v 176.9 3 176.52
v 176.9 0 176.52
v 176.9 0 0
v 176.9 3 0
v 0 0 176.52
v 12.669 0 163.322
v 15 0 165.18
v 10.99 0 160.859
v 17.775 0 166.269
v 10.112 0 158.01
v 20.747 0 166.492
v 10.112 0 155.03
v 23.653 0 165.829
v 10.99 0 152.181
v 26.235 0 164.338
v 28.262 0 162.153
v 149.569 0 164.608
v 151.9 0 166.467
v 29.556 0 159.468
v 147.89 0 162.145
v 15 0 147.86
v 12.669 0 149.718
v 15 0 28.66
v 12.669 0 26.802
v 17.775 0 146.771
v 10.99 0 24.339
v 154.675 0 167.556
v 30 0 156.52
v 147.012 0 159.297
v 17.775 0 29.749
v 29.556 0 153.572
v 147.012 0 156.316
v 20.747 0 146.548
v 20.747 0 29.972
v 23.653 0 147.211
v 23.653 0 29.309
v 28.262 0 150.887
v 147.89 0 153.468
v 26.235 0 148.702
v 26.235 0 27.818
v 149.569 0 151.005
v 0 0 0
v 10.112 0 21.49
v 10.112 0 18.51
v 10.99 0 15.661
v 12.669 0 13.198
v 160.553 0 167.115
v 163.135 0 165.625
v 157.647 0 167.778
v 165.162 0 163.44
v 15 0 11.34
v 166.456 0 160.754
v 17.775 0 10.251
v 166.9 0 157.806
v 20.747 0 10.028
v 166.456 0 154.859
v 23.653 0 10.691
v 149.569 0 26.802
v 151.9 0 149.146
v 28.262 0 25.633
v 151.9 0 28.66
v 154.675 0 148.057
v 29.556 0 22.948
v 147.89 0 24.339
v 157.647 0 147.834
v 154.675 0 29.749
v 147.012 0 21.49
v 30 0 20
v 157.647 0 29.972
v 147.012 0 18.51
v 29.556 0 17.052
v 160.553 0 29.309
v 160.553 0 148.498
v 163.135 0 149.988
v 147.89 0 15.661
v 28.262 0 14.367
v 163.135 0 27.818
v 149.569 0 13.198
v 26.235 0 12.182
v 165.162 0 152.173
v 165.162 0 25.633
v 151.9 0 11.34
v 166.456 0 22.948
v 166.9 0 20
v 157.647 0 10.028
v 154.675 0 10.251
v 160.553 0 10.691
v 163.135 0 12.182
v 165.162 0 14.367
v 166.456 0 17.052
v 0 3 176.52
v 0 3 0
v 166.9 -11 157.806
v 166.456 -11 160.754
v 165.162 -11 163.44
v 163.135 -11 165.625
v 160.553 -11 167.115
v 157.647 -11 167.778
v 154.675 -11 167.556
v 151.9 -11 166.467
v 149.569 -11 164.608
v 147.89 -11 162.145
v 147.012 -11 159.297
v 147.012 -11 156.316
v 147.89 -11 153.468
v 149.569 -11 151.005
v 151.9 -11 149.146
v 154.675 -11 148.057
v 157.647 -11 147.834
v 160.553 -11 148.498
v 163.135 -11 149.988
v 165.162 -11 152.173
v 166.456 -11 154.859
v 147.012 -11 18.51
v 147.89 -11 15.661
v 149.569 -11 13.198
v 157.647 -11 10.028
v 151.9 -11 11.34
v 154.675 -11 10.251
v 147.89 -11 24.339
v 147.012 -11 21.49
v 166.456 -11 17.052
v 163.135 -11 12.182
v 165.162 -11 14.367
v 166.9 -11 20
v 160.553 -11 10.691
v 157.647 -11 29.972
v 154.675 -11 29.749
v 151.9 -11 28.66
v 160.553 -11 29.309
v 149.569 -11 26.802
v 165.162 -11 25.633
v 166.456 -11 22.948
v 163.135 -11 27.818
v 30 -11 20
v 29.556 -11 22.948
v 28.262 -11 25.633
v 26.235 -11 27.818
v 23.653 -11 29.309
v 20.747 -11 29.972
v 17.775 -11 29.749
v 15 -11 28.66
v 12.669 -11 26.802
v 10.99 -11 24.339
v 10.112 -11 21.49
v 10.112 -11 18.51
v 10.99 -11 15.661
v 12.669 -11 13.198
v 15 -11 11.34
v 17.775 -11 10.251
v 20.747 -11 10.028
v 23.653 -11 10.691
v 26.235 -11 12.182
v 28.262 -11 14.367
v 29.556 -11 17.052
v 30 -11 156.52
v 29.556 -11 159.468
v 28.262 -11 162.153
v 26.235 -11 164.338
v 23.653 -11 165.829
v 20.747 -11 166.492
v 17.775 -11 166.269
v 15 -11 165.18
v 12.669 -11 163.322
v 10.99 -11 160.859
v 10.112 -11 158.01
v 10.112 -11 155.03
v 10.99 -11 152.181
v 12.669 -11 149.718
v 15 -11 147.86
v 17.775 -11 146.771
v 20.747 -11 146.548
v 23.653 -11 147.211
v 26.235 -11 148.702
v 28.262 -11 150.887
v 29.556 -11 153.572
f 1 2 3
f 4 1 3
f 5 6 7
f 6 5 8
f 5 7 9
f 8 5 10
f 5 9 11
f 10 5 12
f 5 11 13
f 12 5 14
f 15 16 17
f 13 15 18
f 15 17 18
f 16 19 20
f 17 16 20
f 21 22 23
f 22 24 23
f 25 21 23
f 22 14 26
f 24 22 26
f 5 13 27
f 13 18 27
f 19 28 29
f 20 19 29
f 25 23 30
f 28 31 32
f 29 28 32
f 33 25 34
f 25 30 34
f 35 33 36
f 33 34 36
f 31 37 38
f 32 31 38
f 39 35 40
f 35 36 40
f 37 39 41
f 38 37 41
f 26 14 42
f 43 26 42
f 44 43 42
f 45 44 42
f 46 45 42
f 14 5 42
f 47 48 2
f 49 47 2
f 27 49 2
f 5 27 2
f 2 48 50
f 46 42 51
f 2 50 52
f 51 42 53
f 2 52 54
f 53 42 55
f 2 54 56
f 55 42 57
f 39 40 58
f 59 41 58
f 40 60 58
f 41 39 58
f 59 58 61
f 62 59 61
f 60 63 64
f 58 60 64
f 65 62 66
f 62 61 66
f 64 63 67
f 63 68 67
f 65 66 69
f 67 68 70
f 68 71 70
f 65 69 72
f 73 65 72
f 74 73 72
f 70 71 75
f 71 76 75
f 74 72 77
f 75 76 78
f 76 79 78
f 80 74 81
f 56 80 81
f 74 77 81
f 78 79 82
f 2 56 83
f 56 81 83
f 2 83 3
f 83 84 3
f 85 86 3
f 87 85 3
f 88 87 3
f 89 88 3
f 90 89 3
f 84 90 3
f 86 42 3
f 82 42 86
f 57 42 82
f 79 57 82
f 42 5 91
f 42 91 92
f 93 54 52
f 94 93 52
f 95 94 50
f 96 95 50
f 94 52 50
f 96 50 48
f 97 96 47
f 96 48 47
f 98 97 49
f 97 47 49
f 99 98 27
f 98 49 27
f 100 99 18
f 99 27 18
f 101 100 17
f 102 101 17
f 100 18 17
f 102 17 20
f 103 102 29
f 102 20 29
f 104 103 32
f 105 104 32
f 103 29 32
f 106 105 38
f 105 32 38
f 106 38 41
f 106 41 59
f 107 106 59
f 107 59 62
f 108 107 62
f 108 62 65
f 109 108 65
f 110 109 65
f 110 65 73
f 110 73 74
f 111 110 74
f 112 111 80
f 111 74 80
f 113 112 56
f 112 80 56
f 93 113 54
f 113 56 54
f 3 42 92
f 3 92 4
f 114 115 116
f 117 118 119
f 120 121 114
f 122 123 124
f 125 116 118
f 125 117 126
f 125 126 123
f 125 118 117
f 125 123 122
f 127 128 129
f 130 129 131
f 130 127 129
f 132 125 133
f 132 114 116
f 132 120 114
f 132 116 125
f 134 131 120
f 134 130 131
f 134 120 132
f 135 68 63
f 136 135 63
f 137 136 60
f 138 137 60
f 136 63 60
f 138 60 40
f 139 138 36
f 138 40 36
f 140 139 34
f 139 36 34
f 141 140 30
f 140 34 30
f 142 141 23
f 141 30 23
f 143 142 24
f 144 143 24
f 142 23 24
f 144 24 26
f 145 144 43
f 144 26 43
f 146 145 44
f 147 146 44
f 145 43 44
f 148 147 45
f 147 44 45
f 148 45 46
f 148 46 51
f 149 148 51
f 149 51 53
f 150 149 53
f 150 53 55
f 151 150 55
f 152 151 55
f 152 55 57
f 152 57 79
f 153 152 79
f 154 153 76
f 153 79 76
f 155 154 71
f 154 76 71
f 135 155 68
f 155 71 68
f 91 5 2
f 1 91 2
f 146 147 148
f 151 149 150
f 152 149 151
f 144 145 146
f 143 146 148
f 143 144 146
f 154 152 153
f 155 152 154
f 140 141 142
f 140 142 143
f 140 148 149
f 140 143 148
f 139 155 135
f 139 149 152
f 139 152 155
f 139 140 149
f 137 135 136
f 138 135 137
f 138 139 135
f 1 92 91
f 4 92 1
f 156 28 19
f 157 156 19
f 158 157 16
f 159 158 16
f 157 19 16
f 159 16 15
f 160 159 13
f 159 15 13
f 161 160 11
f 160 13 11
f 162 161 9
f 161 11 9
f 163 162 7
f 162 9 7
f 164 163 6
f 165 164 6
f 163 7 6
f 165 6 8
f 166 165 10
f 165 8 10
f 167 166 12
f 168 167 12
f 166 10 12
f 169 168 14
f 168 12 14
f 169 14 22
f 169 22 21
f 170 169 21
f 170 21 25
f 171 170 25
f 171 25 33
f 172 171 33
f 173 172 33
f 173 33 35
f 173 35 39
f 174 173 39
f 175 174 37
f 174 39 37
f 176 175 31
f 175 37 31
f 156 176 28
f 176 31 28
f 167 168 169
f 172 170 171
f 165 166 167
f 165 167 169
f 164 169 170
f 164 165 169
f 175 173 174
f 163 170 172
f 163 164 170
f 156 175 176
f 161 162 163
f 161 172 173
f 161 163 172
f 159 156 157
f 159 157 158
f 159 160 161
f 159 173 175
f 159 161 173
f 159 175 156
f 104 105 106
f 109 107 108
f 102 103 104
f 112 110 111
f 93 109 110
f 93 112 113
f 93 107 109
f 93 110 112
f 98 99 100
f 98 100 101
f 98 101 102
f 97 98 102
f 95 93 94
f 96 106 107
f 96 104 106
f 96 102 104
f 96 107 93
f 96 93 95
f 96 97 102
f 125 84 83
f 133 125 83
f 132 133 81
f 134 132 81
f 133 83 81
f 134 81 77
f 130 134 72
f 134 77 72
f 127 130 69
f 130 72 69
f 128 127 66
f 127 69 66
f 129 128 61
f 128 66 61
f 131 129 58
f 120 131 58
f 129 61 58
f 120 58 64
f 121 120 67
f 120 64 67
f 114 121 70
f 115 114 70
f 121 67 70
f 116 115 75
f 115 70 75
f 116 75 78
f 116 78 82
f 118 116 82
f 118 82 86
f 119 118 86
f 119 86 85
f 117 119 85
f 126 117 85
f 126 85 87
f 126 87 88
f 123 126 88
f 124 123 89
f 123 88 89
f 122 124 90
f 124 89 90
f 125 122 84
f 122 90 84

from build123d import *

# Parameters (mm, degrees)
SKETCH2_W           = 176.9
SKETCH2_H           = 176.52
BOSS_EXTRUDE1_DEPTH = 3
SKETCH6_R           = 10
BOSS_EXTRUDE4_DEPTH = 11


with BuildPart() as part:
    # Sketch2 → Boss-Extrude1 (new body)
    with BuildSketch(Plane(origin=(0, 0, 0), x_dir=(1, 0, 0), z_dir=(0, 1, 0))):
        with Locations((88.45, -88.26)):
            Rectangle(SKETCH2_W, SKETCH2_H)
    extrude(amount=BOSS_EXTRUDE1_DEPTH)

    # Sketch6 → Boss-Extrude4 (add)
    with BuildSketch(Plane.XZ):
        with Locations((20, 156.52)):
            Circle(SKETCH6_R)
        with Locations((156.9, 20)):
            Circle(SKETCH6_R)
        with Locations((20, 20)):
            Circle(SKETCH6_R)
        with Locations((156.9, 157.806439708)):
            Circle(SKETCH6_R)
    extrude(amount=BOSS_EXTRUDE4_DEPTH)


solid = part.part
